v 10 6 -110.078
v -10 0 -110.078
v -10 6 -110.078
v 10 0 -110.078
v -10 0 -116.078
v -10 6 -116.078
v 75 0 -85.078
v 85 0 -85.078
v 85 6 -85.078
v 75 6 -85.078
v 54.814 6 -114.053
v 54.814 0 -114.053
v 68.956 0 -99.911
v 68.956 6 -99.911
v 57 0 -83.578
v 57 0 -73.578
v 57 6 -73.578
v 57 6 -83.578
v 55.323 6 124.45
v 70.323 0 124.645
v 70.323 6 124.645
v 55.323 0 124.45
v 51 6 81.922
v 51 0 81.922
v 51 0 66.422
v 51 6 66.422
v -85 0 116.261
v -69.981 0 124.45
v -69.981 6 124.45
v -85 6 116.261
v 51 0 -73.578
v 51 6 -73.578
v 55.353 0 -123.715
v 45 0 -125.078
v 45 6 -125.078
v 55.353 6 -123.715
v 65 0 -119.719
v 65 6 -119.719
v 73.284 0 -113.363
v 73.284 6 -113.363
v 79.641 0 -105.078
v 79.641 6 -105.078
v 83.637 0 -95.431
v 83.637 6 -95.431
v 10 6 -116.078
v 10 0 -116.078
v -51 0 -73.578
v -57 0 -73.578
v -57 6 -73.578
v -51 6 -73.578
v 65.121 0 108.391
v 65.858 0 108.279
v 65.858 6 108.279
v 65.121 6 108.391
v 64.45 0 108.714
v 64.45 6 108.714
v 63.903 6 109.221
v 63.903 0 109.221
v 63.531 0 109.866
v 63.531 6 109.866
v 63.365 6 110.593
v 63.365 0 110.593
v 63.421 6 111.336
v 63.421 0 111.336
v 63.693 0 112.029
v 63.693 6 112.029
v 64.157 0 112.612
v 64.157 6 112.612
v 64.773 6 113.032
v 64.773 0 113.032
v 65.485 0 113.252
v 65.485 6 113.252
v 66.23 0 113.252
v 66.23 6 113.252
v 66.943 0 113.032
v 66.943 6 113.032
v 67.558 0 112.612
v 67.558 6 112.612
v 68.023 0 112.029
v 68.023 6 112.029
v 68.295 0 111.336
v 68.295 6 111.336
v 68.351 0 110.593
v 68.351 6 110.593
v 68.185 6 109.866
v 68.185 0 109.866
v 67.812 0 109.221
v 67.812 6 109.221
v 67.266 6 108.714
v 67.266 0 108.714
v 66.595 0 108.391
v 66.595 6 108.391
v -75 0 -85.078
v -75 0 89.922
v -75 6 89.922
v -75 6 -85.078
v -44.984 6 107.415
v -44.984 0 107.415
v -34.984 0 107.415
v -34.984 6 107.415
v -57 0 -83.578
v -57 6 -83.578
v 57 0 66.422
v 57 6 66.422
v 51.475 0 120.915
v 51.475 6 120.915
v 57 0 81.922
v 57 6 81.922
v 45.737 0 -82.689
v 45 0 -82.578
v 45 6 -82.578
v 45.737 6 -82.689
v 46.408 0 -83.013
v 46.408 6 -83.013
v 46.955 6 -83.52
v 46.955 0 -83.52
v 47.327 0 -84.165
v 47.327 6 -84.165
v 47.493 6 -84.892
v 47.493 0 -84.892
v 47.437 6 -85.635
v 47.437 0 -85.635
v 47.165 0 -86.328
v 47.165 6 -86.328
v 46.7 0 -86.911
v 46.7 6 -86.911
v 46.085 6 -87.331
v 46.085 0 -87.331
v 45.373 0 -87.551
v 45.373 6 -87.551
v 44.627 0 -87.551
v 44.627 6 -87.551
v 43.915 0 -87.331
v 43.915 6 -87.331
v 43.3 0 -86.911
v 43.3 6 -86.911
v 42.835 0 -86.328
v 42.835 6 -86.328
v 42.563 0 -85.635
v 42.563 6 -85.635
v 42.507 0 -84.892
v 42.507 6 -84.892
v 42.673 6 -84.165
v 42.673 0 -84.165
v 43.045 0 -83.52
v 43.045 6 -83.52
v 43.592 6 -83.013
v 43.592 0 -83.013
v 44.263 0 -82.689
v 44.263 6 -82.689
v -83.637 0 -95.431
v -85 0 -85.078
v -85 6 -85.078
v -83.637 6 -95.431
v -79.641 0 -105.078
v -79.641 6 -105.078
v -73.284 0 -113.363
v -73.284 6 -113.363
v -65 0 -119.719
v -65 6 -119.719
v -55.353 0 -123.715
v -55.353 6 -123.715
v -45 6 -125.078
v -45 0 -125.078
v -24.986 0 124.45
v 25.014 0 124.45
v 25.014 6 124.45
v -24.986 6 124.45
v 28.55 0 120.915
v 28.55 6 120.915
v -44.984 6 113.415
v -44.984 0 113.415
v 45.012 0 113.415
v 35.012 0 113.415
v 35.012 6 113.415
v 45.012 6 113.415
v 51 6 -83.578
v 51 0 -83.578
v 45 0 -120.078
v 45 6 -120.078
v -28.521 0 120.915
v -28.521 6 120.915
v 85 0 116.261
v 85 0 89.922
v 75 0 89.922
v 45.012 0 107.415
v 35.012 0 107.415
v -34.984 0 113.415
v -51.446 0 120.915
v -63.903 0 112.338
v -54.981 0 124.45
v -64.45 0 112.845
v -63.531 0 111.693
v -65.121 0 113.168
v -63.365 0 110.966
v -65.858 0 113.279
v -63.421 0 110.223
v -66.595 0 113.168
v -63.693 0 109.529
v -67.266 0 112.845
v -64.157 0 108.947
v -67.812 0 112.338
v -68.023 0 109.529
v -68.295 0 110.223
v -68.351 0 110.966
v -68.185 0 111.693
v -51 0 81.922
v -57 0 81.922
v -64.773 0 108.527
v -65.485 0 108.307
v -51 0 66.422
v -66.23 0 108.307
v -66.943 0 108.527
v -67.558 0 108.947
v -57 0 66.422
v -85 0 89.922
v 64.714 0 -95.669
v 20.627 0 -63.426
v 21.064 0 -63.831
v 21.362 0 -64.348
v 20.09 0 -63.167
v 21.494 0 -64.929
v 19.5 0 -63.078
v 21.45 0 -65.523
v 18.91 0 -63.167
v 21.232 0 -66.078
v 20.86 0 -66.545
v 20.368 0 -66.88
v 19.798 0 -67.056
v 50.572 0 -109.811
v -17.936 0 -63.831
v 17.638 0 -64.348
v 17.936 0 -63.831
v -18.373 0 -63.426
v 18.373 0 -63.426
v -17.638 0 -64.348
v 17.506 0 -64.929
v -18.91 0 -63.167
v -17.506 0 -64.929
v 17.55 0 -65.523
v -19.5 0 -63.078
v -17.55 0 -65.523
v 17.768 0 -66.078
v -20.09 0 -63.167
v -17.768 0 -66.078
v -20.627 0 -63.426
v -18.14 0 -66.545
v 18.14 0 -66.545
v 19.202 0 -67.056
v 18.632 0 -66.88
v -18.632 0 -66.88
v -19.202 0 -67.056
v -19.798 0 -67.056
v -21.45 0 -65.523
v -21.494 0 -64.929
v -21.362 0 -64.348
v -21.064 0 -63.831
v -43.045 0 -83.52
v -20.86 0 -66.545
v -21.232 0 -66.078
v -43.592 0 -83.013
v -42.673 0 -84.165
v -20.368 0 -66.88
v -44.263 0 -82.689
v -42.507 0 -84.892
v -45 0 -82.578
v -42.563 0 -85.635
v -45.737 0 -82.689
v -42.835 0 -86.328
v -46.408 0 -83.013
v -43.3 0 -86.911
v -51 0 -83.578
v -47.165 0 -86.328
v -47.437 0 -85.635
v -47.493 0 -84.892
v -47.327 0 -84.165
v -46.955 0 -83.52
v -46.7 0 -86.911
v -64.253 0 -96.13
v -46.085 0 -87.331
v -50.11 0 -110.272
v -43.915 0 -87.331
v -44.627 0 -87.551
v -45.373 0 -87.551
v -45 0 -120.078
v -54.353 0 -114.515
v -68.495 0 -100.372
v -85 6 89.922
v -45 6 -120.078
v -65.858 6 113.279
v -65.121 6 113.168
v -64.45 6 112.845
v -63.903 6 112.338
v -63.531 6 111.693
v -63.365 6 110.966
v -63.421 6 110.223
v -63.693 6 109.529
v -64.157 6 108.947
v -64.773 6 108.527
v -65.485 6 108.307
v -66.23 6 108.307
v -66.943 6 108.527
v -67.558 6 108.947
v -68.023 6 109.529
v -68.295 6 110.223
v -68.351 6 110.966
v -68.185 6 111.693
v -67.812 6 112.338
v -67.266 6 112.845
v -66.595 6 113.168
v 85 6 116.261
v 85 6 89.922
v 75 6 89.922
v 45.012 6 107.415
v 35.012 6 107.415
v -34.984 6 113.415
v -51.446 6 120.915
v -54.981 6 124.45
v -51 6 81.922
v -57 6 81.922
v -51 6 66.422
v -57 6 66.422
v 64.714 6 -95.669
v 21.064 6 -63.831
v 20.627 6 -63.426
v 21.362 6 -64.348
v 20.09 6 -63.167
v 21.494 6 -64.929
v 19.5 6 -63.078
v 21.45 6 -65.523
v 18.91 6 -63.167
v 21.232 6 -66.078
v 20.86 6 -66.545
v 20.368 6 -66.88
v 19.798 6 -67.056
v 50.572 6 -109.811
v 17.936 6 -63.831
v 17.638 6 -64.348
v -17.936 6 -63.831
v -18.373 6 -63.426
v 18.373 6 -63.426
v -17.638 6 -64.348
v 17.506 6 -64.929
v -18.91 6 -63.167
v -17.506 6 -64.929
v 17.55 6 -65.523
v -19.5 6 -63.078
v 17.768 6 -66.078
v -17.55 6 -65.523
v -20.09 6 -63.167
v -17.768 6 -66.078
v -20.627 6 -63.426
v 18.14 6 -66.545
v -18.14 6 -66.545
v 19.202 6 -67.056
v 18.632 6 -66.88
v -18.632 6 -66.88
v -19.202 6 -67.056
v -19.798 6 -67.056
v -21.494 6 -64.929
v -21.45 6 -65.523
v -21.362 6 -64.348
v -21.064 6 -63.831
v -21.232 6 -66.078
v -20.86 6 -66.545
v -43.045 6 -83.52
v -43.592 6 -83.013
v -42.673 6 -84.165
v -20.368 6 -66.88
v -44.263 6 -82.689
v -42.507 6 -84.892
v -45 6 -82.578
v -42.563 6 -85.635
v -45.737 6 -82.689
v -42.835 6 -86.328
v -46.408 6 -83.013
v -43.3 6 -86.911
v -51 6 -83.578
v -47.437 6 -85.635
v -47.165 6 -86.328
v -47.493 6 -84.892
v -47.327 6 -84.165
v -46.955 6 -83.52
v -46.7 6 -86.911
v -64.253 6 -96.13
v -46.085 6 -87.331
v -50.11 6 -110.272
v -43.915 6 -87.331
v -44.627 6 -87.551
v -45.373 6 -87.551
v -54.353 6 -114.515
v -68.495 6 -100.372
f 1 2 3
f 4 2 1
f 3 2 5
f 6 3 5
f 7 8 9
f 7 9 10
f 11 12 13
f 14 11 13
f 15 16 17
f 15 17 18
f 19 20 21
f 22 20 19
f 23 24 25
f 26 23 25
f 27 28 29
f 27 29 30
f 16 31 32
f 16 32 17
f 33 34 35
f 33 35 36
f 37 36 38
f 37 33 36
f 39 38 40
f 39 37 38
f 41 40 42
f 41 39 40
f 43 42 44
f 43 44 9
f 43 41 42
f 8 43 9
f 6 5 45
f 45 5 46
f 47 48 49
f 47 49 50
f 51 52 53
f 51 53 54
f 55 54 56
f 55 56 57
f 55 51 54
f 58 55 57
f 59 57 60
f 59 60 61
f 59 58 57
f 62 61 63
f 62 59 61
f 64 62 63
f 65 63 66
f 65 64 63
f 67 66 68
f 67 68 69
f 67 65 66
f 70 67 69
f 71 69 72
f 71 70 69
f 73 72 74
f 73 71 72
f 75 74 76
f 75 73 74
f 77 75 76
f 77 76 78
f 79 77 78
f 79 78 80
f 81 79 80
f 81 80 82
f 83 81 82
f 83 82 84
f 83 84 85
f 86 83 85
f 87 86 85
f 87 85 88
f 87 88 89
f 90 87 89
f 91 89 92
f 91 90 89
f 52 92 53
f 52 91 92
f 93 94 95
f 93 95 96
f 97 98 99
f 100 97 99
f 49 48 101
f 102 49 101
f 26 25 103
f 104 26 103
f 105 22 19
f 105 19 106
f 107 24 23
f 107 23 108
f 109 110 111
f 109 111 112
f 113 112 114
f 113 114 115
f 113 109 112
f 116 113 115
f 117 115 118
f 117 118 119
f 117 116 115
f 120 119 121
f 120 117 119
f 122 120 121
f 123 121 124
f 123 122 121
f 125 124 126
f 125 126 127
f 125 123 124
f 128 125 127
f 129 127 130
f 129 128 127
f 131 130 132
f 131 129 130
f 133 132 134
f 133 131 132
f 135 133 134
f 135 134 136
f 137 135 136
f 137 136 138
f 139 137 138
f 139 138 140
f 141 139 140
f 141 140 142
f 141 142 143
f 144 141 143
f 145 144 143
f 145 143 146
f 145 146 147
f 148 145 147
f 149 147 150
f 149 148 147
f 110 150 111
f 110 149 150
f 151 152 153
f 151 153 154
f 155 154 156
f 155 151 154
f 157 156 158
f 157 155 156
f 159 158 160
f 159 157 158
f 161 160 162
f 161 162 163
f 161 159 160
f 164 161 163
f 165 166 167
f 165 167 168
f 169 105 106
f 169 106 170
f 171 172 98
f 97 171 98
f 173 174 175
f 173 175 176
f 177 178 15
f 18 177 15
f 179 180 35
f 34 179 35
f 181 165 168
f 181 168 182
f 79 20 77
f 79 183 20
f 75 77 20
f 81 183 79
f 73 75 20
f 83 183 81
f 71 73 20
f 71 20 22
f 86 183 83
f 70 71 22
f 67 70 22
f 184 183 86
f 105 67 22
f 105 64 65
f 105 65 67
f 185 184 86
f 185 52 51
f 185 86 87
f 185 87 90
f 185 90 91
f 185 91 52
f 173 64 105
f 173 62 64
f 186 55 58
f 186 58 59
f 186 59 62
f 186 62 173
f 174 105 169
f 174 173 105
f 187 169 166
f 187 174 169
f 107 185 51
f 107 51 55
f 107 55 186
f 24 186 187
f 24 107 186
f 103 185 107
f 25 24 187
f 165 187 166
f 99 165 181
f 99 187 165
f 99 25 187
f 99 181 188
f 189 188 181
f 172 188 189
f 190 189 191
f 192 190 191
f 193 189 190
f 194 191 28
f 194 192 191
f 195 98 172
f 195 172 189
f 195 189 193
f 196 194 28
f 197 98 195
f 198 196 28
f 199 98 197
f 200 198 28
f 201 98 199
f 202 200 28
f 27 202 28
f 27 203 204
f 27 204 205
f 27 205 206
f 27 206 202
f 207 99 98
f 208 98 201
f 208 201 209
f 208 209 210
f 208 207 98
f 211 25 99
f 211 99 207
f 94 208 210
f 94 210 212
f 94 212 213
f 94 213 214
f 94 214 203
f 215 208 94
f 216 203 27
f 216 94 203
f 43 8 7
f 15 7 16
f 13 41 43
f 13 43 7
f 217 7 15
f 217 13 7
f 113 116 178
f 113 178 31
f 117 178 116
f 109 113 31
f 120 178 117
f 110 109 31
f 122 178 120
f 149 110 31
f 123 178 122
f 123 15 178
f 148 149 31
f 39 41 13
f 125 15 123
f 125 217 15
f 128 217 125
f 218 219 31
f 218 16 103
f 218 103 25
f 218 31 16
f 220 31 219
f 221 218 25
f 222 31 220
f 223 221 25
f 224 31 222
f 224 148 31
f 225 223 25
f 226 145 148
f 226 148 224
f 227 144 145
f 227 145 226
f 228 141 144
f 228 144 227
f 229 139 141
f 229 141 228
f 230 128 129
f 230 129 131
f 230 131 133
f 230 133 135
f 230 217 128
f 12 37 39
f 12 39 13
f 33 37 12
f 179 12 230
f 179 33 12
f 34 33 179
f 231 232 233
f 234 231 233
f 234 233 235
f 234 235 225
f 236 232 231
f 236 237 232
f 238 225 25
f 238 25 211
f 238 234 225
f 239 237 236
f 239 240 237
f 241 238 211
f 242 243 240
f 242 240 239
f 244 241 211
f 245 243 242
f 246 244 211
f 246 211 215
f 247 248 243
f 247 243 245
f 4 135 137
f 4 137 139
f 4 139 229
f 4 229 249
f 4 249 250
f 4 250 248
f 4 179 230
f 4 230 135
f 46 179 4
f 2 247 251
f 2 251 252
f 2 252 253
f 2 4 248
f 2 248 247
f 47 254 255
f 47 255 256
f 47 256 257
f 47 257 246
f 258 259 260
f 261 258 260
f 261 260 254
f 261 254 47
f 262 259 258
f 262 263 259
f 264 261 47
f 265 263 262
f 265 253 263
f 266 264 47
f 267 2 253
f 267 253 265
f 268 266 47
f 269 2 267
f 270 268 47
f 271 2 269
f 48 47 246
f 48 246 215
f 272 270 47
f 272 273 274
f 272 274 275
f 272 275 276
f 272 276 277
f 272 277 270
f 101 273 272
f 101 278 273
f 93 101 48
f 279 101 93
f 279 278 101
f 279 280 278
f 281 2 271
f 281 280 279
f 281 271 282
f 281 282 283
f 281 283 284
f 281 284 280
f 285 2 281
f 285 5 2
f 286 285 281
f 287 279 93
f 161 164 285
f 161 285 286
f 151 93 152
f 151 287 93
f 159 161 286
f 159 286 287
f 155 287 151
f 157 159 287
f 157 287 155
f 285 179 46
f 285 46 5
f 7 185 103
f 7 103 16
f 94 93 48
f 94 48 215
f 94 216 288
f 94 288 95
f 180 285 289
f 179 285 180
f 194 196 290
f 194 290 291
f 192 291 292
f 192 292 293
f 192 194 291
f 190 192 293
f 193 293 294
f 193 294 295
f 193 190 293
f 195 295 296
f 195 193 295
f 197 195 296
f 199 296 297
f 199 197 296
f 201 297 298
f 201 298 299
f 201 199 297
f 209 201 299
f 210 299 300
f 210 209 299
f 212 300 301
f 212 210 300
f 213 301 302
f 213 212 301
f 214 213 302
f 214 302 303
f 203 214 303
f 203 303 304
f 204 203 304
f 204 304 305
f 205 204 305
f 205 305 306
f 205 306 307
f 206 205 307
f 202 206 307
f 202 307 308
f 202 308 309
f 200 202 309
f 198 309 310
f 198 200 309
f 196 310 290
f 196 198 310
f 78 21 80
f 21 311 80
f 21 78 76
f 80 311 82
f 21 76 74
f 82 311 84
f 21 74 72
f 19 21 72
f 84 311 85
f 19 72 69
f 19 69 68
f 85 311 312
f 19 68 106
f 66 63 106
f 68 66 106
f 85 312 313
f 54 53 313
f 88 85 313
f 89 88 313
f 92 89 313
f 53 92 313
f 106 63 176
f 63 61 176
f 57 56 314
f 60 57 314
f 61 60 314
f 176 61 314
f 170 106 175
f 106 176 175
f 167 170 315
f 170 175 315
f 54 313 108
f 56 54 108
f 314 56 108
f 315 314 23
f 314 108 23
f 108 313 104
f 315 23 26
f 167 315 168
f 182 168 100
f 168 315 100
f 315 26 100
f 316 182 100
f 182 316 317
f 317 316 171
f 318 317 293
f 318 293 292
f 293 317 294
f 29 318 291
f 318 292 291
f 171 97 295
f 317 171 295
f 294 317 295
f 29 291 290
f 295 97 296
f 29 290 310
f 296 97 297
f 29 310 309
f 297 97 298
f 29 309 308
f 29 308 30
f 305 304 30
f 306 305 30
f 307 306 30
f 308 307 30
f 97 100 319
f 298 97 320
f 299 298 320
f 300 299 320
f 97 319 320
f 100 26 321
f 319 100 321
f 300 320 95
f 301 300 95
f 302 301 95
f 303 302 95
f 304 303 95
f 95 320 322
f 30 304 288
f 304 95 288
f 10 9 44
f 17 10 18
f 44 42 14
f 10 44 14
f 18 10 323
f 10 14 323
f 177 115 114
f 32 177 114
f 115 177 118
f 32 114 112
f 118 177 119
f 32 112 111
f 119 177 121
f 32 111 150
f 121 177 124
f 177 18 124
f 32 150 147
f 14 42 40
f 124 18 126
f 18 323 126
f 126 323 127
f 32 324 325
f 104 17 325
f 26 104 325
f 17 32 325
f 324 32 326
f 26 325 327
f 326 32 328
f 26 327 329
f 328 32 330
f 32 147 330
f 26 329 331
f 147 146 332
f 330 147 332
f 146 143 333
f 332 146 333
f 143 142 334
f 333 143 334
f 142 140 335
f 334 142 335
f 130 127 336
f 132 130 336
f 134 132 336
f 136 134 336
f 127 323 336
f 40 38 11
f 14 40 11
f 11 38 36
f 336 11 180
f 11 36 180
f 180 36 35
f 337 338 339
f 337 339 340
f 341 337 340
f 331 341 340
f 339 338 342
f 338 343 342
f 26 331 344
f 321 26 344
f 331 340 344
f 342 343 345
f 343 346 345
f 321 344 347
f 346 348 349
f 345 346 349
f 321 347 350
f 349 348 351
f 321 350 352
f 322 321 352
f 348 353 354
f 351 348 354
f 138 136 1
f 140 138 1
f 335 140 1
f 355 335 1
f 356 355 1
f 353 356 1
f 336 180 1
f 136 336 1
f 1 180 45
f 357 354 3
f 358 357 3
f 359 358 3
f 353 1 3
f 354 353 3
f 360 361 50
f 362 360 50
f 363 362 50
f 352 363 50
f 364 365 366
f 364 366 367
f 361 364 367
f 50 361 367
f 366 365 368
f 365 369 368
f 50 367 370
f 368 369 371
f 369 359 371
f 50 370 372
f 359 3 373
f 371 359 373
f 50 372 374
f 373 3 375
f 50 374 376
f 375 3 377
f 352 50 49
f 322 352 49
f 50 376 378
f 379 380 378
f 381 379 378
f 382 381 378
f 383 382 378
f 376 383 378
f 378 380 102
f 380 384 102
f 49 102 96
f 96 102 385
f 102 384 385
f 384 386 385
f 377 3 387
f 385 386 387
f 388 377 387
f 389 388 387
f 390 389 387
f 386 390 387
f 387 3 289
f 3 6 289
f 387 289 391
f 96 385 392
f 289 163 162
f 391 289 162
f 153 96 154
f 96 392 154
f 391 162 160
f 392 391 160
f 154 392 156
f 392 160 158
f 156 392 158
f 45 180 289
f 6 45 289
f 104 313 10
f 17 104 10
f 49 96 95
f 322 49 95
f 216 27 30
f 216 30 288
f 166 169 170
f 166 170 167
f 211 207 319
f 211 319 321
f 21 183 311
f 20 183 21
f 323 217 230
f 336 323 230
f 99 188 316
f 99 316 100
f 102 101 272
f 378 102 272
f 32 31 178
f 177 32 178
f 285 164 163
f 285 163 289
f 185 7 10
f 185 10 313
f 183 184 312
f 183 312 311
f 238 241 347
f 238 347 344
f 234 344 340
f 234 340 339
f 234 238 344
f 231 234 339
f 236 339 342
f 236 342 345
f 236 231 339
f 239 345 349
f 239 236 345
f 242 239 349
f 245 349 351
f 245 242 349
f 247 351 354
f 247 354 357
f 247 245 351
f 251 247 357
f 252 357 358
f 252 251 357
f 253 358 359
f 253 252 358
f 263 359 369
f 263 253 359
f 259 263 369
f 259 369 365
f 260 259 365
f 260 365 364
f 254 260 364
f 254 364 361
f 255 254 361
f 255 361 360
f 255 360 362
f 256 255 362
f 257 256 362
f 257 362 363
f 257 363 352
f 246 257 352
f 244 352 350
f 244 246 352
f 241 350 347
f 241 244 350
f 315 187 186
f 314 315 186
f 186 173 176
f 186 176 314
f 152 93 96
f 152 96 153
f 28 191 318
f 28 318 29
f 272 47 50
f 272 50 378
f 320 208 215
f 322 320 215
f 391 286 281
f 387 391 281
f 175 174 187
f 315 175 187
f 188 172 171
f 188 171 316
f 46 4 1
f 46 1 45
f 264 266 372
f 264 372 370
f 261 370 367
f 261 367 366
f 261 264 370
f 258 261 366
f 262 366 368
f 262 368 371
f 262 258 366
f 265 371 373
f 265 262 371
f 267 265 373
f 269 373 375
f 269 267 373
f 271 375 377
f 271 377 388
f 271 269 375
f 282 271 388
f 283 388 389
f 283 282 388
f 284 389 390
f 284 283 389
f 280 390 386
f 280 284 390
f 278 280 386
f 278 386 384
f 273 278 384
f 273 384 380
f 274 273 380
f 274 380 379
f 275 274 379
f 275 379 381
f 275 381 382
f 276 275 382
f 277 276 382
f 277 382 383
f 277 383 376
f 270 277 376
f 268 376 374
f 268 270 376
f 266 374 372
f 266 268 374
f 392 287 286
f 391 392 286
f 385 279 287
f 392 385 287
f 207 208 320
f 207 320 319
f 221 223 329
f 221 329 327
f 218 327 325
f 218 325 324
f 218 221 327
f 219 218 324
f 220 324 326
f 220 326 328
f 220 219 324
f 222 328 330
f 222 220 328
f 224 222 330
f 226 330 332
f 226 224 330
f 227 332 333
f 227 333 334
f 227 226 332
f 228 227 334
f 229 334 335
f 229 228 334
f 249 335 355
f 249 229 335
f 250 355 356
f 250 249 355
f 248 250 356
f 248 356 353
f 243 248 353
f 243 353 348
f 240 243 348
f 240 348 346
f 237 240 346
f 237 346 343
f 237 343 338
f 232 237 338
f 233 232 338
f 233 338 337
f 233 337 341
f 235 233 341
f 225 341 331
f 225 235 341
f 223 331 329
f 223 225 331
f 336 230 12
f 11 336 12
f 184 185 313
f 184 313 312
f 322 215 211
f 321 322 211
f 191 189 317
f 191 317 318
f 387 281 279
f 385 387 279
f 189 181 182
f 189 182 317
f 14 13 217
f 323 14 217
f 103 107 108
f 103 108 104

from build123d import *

# Parameters (mm, degrees)
SKETCH1_R           = 2.5
SKETCH1_R_2         = 2
SKETCH1_W           = 20
SKETCH1_H           = 6
SKETCH1_W_2         = 10
SKETCH1_W_3         = 6
SKETCH1_H_2         = 15.5
SKETCH1_H_3         = 10
BOSS_EXTRUDE1_DEPTH = 6


with BuildPart() as part:
    # Sketch1 → Boss-Extrude1 (new body)
    with BuildSketch(Plane(origin=(0, 0, 0), x_dir=(1, 0, 0), z_dir=(0, 1, 0))):
        with BuildLine():
            Line((-45, 125.078427477), (-45, 120.078427477))
            Line((-45, 120.078427477), (45, 120.078427477))
            Line((45, 120.078427477), (45, 125.078427477))
            ThreePointArc((45, 125.078427477), (73.284271247, 113.362698724), (85, 85.078427477))
            Line((85, 85.078427477), (75, 85.078427477))
            Line((75, 85.078427477), (75, -89.921572523))
            Line((75, -89.921572523), (85, -89.921572523))
            Line((85, -89.921572523), (85, -116.261318485))
            Line((85, -116.261318485), (70.323194947, -124.644732005))
            Line((70.323194947, -124.644732005), (55.323194947, -124.450192088))
            Line((55.323194947, -124.450192088), (51.474604803, -120.914658182))
            Line((51.474604803, -120.914658182), (28.549864753, -120.914658182))
            Line((28.549864753, -120.914658182), (25.014330847, -124.450192088))
            Line((25.014330847, -124.450192088), (-24.985669153, -124.450192088))
            Line((-24.985669153, -124.450192088), (-28.521203059, -120.914658182))
            Line((-28.521203059, -120.914658182), (-51.44594311, -120.914658182))
            Line((-51.44594311, -120.914658182), (-54.981477016, -124.450192088))
            Line((-54.981477016, -124.450192088), (-69.981477016, -124.450192088))
            Line((-69.981477016, -124.450192088), (-85, -116.261318485))
            Line((-85, -116.261318485), (-85, -89.921572523))
            Line((-85, -89.921572523), (-75, -89.921572523))
            Line((-75, -89.921572523), (-75, 85.078427477))
            Line((-75, 85.078427477), (-85, 85.078427477))
            ThreePointArc((-85, 85.078427477), (-73.284271247, 113.362698724), (-45, 125.078427477))
        make_face()
        with Locations(Location((-45, 85.078427477, 0), (0, 0, 270))):
            Circle(SKETCH1_R, mode=Mode.SUBTRACT)
        with Locations(Location((45, 85.078427477, 0), (0, 0, 270))):
            Circle(SKETCH1_R, mode=Mode.SUBTRACT)
        with Locations(Location((-65.857864376, -110.779436899, 0), (0, 0, 270))):
            Circle(SKETCH1_R, mode=Mode.SUBTRACT)
        with Locations(Location((65.857864376, -110.779436899, 0), (0, 0, 90))):
            Circle(SKETCH1_R, mode=Mode.SUBTRACT)
        with Locations(Location((19.5, 65.078427477, 0), (0, 0, 270))):
            Circle(SKETCH1_R_2, mode=Mode.SUBTRACT)
        with Locations(Location((-19.5, 65.078427477, 0), (0, 0, 270))):
            Circle(SKETCH1_R_2, mode=Mode.SUBTRACT)
        Polygon((50.571600169, 109.810660524), (54.814240856, 114.053301211), (68.95637648, 99.911165587), (64.713735792, 95.6685249), align=None, mode=Mode.SUBTRACT)
        with Locations((0, 113.078427477)):
            Rectangle(SKETCH1_W, SKETCH1_H, mode=Mode.SUBTRACT)
        Polygon((-50.11039508, 110.271865613), (-64.252530704, 96.129729989), (-68.495171391, 100.372370676), (-54.353035767, 114.5145063), align=None, mode=Mode.SUBTRACT)
        with Locations((-39.983573085, -110.414658182)):
            Rectangle(SKETCH1_W_2, SKETCH1_H, mode=Mode.SUBTRACT)
        with Locations((40.012234778, -110.414658182)):
            Rectangle(SKETCH1_W_2, SKETCH1_H, mode=Mode.SUBTRACT)
        with Locations((54, -74.171572523)):
            Rectangle(SKETCH1_W_3, SKETCH1_H_2, mode=Mode.SUBTRACT)
        with Locations((-54, -74.171572523)):
            Rectangle(SKETCH1_W_3, SKETCH1_H_2, mode=Mode.SUBTRACT)
        with Locations((54, 78.578427477)):
            Rectangle(SKETCH1_W_3, SKETCH1_H_3, mode=Mode.SUBTRACT)
        with Locations((-54, 78.578427477)):
            Rectangle(SKETCH1_W_3, SKETCH1_H_3, mode=Mode.SUBTRACT)
    extrude(amount=BOSS_EXTRUDE1_DEPTH)


solid = part.part
